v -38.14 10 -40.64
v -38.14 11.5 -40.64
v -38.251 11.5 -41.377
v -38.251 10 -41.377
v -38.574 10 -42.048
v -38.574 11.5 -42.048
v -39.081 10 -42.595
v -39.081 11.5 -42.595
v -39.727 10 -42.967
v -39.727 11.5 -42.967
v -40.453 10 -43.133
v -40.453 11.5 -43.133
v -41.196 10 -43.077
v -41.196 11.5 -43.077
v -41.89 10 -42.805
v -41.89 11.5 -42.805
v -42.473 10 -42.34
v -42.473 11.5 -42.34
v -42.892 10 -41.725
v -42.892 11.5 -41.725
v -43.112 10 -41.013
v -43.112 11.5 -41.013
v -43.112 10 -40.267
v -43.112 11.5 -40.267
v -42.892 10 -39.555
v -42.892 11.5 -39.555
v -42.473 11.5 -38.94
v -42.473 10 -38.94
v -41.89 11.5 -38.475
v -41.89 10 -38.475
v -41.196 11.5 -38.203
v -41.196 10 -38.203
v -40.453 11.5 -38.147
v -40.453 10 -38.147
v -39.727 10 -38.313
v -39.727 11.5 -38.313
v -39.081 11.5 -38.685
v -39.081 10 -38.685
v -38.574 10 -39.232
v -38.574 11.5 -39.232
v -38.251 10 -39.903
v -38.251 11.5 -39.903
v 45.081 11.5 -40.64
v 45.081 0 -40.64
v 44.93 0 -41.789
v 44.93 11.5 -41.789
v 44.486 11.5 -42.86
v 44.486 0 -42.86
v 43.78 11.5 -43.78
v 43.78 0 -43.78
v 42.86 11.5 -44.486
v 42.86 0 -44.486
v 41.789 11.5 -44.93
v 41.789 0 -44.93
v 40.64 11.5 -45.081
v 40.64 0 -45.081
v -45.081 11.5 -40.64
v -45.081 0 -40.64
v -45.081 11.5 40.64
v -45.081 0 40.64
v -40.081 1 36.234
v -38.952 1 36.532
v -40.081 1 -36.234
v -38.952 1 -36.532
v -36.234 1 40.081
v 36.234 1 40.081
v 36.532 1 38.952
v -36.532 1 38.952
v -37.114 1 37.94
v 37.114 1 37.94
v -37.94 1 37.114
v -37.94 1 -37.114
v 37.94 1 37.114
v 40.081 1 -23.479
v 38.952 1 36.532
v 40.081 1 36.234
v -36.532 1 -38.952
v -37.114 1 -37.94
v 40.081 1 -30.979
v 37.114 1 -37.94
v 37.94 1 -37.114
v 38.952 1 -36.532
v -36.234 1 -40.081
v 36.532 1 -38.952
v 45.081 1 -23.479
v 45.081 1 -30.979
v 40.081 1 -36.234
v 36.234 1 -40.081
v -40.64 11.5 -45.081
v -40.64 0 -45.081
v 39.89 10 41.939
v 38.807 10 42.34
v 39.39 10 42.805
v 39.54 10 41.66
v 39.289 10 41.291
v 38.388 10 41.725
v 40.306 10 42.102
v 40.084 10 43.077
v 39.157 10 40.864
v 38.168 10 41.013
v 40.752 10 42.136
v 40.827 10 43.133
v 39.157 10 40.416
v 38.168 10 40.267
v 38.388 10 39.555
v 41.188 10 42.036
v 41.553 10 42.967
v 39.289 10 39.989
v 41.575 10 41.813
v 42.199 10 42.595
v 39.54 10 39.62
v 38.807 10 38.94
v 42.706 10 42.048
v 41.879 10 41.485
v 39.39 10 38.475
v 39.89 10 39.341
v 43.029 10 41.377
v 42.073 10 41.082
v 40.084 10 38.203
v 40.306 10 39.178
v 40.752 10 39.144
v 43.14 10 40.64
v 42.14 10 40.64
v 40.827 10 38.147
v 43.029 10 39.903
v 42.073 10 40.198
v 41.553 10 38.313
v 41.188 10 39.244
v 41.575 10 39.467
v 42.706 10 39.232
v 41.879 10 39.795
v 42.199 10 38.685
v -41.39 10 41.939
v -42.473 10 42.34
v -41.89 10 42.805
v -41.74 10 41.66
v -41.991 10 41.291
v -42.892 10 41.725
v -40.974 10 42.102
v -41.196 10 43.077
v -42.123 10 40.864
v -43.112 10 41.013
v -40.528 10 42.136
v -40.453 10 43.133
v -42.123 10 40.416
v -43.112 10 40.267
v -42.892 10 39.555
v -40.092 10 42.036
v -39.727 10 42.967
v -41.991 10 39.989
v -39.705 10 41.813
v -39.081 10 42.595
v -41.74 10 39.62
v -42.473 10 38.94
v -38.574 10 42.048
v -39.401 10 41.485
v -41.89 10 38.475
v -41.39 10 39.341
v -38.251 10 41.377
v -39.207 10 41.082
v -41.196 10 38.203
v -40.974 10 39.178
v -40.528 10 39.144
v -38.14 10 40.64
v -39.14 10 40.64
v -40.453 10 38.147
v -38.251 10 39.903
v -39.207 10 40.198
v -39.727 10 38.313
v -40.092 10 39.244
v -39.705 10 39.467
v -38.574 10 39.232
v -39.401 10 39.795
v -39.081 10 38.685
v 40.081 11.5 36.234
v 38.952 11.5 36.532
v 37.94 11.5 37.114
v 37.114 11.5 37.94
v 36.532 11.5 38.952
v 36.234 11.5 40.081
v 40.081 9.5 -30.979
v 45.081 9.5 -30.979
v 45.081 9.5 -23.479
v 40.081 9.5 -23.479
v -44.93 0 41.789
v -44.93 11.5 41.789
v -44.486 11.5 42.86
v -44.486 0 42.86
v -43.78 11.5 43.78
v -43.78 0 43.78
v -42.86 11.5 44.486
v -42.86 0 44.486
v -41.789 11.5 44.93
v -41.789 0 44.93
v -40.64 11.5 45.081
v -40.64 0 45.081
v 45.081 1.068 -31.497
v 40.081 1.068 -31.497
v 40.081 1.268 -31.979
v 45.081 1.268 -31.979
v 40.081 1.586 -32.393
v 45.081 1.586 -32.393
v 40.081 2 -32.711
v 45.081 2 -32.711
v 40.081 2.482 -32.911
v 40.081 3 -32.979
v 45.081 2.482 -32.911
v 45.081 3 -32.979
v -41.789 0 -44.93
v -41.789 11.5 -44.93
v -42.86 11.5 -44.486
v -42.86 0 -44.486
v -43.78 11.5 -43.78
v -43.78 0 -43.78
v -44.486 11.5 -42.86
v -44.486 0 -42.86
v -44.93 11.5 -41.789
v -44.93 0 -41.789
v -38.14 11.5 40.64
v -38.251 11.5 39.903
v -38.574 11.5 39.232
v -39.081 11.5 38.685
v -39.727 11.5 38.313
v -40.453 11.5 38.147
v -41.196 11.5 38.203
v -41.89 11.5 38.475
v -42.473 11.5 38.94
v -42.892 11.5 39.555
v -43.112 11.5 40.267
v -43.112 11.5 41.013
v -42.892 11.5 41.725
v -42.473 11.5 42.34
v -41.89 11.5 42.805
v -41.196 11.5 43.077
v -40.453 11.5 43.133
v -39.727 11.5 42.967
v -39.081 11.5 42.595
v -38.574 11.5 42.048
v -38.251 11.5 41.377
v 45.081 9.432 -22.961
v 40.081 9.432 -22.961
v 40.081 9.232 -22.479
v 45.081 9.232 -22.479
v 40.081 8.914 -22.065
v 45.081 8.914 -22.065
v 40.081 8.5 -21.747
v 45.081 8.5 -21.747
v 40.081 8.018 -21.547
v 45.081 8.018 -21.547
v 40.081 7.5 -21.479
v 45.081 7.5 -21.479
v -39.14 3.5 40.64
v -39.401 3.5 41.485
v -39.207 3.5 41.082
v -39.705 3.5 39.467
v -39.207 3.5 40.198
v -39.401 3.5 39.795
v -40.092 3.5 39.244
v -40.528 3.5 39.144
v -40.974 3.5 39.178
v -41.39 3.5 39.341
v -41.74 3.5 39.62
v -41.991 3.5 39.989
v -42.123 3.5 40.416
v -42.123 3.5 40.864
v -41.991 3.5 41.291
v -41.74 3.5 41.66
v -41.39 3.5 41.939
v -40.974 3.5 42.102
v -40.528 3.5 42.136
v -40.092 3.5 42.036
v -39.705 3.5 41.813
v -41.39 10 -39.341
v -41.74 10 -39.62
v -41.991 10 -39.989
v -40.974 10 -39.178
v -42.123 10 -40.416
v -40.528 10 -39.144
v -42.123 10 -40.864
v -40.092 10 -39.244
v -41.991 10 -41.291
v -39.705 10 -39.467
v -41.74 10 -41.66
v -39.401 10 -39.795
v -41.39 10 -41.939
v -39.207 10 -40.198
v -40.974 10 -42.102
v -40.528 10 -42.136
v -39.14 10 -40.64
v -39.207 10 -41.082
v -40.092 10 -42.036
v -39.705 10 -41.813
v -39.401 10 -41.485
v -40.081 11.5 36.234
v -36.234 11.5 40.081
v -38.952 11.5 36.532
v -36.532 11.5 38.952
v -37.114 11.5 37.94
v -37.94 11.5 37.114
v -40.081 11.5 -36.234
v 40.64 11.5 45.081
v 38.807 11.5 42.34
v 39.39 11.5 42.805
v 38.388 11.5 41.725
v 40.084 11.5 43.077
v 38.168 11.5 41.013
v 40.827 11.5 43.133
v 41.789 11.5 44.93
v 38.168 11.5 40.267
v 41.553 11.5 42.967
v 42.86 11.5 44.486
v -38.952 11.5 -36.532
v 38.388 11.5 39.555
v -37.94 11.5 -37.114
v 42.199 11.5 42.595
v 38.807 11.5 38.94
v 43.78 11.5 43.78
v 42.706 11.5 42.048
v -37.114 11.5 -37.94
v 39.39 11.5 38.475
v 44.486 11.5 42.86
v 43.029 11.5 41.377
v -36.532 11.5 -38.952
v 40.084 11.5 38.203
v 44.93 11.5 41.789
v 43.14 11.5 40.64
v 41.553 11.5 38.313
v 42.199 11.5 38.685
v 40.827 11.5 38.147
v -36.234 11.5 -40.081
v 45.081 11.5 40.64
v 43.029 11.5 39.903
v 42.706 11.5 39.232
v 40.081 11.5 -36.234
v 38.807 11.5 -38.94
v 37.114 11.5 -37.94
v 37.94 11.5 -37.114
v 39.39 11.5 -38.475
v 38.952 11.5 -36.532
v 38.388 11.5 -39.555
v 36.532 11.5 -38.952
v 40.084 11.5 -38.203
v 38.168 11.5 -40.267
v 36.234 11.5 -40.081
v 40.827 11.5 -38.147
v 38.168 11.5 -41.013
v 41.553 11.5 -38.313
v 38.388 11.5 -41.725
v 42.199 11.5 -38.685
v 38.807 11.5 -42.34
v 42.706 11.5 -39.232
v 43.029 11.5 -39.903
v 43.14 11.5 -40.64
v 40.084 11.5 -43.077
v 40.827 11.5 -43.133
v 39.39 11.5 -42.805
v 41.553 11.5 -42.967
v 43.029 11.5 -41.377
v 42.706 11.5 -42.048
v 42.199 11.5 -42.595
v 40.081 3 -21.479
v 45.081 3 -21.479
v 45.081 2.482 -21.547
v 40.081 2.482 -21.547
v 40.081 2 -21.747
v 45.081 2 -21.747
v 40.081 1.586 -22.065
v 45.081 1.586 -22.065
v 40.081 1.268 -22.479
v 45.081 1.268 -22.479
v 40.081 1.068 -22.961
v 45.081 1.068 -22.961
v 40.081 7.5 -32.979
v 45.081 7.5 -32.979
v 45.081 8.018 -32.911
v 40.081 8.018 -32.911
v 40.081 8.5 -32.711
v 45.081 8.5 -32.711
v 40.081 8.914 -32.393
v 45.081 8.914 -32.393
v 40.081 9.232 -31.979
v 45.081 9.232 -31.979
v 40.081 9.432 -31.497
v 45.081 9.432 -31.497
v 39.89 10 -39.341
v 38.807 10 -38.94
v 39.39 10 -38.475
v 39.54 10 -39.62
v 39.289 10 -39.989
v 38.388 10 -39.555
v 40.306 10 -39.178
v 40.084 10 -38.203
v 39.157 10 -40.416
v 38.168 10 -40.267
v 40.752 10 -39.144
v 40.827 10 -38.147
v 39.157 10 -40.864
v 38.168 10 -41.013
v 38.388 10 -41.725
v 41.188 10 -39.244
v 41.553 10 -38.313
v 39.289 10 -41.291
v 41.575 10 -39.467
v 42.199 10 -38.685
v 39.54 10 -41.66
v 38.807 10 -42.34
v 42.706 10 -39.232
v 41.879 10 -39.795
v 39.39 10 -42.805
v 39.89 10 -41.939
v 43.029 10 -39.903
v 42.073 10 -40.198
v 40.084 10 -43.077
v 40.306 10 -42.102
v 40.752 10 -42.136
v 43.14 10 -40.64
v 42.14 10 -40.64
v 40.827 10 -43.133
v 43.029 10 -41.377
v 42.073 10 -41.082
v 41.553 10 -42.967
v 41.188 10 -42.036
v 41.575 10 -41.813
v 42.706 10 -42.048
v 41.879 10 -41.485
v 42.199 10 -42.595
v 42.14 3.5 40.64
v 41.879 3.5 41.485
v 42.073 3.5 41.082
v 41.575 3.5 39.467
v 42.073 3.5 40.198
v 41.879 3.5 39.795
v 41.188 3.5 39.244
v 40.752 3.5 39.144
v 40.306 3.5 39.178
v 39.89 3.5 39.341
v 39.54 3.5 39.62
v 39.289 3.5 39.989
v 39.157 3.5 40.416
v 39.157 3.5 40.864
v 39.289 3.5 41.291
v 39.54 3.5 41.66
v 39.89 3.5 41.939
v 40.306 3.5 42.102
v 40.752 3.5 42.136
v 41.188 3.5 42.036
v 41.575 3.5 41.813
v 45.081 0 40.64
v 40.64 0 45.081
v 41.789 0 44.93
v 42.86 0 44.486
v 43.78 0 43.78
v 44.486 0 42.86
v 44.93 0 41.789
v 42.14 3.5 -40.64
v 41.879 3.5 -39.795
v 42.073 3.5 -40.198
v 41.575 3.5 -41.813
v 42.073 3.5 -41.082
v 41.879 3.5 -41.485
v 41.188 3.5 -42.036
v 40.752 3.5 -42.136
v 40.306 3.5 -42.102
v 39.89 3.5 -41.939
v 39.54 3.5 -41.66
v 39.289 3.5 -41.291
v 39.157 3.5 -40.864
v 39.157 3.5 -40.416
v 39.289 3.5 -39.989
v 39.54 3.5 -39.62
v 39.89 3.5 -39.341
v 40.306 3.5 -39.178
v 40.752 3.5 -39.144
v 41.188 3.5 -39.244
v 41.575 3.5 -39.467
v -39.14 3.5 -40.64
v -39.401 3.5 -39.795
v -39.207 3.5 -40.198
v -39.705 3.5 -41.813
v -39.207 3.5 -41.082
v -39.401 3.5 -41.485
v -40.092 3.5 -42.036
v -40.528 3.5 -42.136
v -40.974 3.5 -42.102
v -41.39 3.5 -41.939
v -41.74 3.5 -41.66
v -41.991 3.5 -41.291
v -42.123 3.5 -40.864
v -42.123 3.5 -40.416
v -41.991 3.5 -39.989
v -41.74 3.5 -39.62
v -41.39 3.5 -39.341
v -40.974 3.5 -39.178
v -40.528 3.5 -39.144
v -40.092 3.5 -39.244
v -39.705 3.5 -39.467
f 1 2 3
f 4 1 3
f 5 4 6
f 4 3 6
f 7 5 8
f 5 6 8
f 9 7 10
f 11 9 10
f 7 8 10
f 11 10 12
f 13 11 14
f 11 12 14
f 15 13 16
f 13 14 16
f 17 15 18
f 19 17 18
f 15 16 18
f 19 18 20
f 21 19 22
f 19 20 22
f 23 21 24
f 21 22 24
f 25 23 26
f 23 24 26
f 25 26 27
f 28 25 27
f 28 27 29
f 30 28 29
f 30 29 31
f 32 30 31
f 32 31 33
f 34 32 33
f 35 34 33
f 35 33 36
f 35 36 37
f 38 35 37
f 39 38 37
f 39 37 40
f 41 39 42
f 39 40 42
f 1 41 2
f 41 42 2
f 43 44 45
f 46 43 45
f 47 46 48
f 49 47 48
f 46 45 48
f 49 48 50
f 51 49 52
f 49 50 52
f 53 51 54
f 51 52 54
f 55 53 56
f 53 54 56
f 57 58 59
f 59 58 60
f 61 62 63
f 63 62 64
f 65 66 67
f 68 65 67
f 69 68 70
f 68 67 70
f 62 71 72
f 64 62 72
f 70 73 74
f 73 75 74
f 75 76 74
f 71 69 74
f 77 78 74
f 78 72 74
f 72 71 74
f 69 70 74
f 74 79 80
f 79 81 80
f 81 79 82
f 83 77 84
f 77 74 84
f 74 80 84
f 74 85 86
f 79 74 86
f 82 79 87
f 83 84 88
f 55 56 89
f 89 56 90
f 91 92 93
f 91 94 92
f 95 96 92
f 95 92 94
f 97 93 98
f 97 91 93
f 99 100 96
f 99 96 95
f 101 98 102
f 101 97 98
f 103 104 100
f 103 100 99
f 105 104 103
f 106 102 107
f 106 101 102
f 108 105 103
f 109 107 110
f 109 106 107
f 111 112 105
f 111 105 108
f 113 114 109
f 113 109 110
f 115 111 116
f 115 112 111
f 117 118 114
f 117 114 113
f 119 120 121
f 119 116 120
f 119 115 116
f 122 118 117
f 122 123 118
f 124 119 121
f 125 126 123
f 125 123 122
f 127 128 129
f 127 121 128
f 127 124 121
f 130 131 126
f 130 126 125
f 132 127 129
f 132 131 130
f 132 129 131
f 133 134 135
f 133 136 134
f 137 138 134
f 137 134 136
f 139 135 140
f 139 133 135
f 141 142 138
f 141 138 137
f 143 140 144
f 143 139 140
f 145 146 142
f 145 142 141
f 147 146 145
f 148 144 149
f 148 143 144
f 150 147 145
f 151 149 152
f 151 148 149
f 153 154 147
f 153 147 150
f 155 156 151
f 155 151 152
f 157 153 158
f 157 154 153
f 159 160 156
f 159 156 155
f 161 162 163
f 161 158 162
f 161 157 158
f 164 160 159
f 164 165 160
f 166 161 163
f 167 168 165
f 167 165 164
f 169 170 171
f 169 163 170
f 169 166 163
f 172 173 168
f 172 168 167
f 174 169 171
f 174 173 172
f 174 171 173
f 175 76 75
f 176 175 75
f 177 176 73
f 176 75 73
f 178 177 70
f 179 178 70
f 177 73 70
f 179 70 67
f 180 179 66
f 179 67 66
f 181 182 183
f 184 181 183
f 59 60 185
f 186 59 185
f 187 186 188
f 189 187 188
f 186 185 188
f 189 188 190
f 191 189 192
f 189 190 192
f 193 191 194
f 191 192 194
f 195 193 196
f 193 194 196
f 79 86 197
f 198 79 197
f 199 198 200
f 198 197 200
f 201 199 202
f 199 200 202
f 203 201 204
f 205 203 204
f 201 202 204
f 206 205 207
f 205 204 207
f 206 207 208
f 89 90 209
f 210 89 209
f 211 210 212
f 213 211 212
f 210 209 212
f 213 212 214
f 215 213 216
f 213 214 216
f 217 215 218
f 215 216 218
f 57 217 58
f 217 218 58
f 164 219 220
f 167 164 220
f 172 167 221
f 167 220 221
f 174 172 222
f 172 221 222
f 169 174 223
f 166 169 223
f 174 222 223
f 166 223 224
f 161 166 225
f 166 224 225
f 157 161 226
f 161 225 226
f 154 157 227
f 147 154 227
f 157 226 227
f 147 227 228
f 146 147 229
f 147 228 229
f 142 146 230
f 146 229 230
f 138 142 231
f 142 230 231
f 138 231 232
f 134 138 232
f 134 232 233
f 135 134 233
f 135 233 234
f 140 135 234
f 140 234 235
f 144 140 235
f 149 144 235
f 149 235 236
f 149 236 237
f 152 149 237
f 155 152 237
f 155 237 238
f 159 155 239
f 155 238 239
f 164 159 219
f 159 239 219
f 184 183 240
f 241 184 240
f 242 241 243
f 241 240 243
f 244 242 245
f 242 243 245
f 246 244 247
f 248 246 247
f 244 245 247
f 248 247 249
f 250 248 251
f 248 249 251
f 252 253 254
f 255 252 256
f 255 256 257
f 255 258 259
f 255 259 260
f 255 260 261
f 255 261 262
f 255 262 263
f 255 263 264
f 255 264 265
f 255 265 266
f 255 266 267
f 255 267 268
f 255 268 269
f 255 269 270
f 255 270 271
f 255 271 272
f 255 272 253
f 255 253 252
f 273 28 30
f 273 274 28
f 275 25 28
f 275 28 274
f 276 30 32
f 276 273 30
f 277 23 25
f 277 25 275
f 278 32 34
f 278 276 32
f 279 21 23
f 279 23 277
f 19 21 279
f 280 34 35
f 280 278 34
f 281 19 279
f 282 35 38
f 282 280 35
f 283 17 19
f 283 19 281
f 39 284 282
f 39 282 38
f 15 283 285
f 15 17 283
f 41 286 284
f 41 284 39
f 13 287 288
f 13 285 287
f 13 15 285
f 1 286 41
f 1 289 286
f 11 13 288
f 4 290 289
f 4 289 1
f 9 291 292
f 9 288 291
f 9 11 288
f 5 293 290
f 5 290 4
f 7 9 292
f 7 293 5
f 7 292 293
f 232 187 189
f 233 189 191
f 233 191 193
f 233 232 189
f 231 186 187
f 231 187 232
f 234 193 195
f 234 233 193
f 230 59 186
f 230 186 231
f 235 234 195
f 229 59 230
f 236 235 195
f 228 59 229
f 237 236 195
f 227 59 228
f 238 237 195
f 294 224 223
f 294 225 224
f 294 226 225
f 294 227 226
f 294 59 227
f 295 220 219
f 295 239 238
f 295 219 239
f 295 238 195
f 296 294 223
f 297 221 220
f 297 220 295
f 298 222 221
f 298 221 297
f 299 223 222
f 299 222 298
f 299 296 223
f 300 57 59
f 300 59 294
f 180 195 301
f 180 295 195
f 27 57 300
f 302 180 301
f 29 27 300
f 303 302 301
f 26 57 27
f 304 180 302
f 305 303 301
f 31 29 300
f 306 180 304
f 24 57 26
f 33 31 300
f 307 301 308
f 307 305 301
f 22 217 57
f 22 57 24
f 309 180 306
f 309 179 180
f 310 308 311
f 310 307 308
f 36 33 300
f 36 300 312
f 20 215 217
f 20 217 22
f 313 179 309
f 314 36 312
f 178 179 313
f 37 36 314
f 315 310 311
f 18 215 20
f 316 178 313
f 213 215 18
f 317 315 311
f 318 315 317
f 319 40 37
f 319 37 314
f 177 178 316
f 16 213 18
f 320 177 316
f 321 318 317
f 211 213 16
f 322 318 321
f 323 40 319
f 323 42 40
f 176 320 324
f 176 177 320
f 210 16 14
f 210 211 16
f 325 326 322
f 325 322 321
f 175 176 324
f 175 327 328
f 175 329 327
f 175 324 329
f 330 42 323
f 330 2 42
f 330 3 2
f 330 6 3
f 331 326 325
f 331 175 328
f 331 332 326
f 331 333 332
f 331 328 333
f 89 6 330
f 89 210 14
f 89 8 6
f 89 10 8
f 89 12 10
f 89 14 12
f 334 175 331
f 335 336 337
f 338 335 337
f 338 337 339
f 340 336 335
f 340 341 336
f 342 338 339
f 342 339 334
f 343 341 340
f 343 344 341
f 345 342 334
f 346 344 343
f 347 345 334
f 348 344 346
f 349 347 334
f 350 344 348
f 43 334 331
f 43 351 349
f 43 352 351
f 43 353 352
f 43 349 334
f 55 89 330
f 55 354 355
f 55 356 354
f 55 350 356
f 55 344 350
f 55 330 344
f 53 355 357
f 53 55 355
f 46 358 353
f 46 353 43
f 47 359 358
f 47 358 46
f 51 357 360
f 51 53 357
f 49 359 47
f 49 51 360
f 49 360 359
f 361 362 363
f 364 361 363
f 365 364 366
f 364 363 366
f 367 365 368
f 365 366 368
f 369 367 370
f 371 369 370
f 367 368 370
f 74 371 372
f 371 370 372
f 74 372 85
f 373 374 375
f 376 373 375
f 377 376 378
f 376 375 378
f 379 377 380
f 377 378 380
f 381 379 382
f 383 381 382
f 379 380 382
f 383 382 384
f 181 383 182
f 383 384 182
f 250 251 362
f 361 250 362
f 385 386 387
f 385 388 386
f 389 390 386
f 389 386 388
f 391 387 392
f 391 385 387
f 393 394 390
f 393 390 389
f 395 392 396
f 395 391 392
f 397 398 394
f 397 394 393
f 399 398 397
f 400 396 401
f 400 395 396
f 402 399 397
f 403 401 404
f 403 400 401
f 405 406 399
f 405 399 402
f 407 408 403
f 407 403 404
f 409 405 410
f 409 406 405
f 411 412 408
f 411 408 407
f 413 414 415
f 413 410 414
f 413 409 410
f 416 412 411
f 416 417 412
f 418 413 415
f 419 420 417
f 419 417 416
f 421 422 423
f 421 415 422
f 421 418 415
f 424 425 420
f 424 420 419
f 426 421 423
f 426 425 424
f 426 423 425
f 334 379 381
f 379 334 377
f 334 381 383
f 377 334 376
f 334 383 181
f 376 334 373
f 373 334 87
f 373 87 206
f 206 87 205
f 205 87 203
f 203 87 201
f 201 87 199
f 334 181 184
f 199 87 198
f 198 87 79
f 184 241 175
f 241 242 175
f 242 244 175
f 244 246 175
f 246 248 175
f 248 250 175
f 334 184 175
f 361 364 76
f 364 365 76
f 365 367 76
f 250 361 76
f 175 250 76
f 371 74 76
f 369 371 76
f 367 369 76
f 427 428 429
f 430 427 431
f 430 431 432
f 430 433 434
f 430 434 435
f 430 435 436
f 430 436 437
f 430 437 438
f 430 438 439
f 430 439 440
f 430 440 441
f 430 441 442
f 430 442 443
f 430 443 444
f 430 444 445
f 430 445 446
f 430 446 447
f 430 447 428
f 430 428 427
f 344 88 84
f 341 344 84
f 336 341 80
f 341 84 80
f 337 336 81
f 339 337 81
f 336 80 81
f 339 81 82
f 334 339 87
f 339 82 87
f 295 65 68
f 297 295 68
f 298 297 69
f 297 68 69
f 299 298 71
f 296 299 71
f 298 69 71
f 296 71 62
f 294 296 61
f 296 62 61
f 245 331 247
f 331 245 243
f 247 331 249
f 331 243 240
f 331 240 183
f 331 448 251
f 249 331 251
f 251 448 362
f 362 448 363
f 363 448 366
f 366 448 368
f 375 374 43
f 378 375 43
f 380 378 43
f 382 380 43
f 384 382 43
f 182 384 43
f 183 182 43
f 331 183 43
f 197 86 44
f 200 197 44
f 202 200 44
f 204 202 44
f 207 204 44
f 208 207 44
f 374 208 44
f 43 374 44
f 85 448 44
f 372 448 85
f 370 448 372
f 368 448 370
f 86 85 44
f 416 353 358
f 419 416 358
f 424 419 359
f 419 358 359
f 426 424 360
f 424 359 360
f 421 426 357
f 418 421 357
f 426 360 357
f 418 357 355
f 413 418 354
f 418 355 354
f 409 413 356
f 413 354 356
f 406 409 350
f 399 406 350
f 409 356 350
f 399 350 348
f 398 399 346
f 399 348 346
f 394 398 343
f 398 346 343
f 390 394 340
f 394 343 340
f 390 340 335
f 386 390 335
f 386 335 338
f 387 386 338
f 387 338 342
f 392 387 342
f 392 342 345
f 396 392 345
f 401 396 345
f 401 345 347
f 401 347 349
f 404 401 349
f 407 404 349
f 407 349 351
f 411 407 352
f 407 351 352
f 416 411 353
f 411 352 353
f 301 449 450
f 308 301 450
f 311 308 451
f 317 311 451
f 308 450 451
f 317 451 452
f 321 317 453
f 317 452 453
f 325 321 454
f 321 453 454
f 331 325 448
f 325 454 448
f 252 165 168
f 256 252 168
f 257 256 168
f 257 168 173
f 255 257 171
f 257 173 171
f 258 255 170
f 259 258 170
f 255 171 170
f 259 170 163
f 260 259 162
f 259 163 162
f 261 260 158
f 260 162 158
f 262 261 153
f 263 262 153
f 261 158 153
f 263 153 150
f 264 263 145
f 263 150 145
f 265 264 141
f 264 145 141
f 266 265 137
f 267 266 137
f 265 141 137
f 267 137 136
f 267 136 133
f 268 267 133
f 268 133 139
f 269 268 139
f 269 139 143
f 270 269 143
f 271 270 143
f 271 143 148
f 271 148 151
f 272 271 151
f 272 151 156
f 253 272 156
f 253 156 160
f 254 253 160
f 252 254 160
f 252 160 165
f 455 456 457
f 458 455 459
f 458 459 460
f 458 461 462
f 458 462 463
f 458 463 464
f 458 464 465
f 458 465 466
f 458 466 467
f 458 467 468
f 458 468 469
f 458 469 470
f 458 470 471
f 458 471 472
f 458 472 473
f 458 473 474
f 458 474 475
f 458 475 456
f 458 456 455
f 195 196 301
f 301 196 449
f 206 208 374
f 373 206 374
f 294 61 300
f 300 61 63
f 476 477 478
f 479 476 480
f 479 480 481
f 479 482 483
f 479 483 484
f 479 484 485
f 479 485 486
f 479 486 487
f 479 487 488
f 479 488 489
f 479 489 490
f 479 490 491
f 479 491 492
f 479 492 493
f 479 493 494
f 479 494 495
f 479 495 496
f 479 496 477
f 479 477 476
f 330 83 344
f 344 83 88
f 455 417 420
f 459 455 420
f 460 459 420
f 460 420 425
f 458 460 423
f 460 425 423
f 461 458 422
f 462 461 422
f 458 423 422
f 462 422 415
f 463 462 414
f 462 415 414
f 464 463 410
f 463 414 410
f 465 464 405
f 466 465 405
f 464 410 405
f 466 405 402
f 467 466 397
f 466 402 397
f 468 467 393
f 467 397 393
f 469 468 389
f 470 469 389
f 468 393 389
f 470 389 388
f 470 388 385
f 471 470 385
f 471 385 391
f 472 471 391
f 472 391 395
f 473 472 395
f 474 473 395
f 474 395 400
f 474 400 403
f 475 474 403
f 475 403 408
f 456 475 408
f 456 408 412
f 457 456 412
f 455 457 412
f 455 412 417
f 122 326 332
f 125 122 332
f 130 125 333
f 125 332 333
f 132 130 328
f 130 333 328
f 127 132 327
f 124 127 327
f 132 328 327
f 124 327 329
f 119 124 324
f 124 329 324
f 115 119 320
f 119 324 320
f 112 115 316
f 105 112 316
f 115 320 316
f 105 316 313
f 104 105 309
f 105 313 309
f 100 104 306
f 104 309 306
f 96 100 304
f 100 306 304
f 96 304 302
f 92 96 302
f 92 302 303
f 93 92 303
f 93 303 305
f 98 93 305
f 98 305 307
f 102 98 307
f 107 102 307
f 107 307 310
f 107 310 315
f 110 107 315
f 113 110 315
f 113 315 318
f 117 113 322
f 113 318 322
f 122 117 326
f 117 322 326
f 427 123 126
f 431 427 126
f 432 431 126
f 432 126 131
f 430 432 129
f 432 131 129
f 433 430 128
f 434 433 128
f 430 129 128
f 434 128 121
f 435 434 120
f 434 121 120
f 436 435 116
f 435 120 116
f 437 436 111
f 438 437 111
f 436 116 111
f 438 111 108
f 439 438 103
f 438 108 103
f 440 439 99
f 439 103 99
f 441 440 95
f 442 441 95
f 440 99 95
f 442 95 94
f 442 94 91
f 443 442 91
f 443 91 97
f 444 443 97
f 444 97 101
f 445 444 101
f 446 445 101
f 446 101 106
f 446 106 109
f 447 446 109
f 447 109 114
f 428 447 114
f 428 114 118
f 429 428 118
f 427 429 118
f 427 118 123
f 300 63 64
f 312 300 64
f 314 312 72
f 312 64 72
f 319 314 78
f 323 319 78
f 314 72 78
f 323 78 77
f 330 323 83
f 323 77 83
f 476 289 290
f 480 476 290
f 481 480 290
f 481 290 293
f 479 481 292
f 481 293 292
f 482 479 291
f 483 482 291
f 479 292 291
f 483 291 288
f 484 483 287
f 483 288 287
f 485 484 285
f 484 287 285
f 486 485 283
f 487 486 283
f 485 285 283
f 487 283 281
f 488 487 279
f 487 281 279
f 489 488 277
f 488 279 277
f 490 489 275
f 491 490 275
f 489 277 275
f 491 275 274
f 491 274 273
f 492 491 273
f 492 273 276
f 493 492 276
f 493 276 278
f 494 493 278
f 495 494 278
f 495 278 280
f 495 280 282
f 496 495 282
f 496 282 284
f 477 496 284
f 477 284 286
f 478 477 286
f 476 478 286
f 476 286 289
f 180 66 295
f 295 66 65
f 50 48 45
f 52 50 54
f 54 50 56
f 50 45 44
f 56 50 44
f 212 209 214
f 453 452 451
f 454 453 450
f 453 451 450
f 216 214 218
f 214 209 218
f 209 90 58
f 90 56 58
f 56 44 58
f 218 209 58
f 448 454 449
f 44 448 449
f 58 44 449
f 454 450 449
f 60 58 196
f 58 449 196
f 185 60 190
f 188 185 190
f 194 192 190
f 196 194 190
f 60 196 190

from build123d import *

# Parameters (mm, degrees)
SKETCH1_W           = 7.937979337
SKETCH1_H           = 0.559115352
BOSS_EXTRUDE1_DEPTH = 11.5
SKETCH2_R           = 1.5
CUT_EXTRUDE1_DEPTH  = 8
CUT_EXTRUDE2_DEPTH  = 8
SKETCH4_R           = 2.5
CUT_EXTRUDE3_DEPTH  = 1.5
BOSS_EXTRUDE2_DEPTH = 1


with BuildPart() as part:
    # Sketch1 → Boss-Extrude1 (new body)
    with BuildSketch(Plane(origin=(0, 0, 0), x_dir=(1, 0, 0), z_dir=(0, 1, 0))):
        with BuildLine():
            Line((-40.080884648, -36.23445276), (-40.080884648, 18.423402639))
            Line((-40.080884648, 18.423402639), (-40.64, 18.423402639))
            Line((-40.64, 18.423402639), (-40.64, -36.199115352))
            ThreePointArc((-40.64, -36.199115352), (-40.359884529, -36.207958509), (-40.080884648, -36.23445276))
        make_face()
        with BuildLine():
            Line((-40.080884648, 18.423402639), (-40.080884648, 36.23445276))
            ThreePointArc((-40.080884648, 36.23445276), (-40.359884529, 36.207958509), (-40.64, 36.199115352))
            Line((-40.64, 36.199115352), (-40.64, 18.423402639))
            Line((-40.64, 18.423402639), (-40.080884648, 18.423402639))
        make_face()
        with BuildLine():
            Line((-36.23445276, 40.080884648), (-7.937979337, 40.080884648))
            Line((-7.937979337, 40.080884648), (-7.937979337, 40.64))
            Line((-7.937979337, 40.64), (-36.199115352, 40.64))
            ThreePointArc((-36.199115352, 40.64), (-36.207958509, 40.359884529), (-36.23445276, 40.080884648))
        make_face()
        with BuildLine():
            Line((0, 40.64), (0, 40.080884648))
            Line((0, 40.080884648), (36.23445276, 40.080884648))
            ThreePointArc((36.23445276, 40.080884648), (36.207958509, 40.359884529), (36.199115352, 40.64))
            Line((36.199115352, 40.64), (0, 40.64))
        make_face()
        with Locations((-3.968989669, 40.360442324)):
            Rectangle(SKETCH1_W, SKETCH1_H)
        with BuildLine():
            ThreePointArc((40.64, 36.199115352), (40.359884529, 36.207958509), (40.080884648, 36.23445276))
            Line((40.080884648, 36.23445276), (40.080884648, 28.268480093))
            Line((40.080884648, 28.268480093), (40.64, 28.268480093))
            Line((40.64, 28.268480093), (40.64, 36.199115352))
        make_face()
        with BuildLine():
            Line((40.64, 28.268480093), (40.080884648, 28.268480093))
            Line((40.080884648, 28.268480093), (40.080884648, -36.23445276))
            ThreePointArc((40.080884648, -36.23445276), (40.359884529, -36.207958509), (40.64, -36.199115352))
            Line((40.64, -36.199115352), (40.64, 28.268480093))
        make_face()
        with BuildLine():
            ThreePointArc((40.64, -36.199115352), (40.359884529, -36.207958509), (40.080884648, -36.23445276))
            ThreePointArc((40.080884648, -36.23445276), (37.499820351, -37.499820351), (36.23445276, -40.080884648))
            ThreePointArc((36.23445276, -40.080884648), (36.207958509, -40.359884529), (36.199115352, -40.64))
            Line((36.199115352, -40.64), (40.64, -40.64))
            Line((40.64, -40.64), (40.64, -36.199115352))
        make_face()
        with BuildLine():
            ThreePointArc((45.080884648, -40.64), (43.780179649, -37.499820351), (40.64, -36.199115352))
            Line((40.64, -36.199115352), (40.64, -40.64))
            Line((40.64, -40.64), (36.199115352, -40.64))
            ThreePointArc((36.199115352, -40.64), (37.499820351, -43.780179649), (40.64, -45.080884648))
            ThreePointArc((40.64, -45.080884648), (43.780179649, -43.780179649), (45.080884648, -40.64))
        make_face()
        with BuildLine():
            ThreePointArc((36.199115352, -40.64), (36.207958509, -40.359884529), (36.23445276, -40.080884648))
            Line((36.23445276, -40.080884648), (27.085817246, -40.080884648))
            Line((27.085817246, -40.080884648), (27.085817246, -40.64))
            Line((27.085817246, -40.64), (36.199115352, -40.64))
        make_face()
        with BuildLine():
            Line((27.085817246, -40.080884648), (-36.23445276, -40.080884648))
            ThreePointArc((-36.23445276, -40.080884648), (-36.207958509, -40.359884529), (-36.199115352, -40.64))
            Line((-36.199115352, -40.64), (27.085817246, -40.64))
            Line((27.085817246, -40.64), (27.085817246, -40.080884648))
        make_face()
        with BuildLine():
            Line((-40.64, -40.64), (-40.64, -36.199115352))
            ThreePointArc((-40.64, -36.199115352), (-43.780179649, -37.499820351), (-45.080884648, -40.64))
            ThreePointArc((-45.080884648, -40.64), (-43.780179649, -43.780179649), (-40.64, -45.080884648))
            ThreePointArc((-40.64, -45.080884648), (-37.499820351, -43.780179649), (-36.199115352, -40.64))
            Line((-36.199115352, -40.64), (-40.64, -40.64))
        make_face()
        with BuildLine():
            ThreePointArc((-36.23445276, -40.080884648), (-37.499820351, -37.499820351), (-40.080884648, -36.23445276))
            ThreePointArc((-40.080884648, -36.23445276), (-40.359884529, -36.207958509), (-40.64, -36.199115352))
            Line((-40.64, -36.199115352), (-40.64, -40.64))
            Line((-40.64, -40.64), (-36.199115352, -40.64))
            ThreePointArc((-36.199115352, -40.64), (-36.207958509, -40.359884529), (-36.23445276, -40.080884648))
        make_face()
        with BuildLine():
            Line((-40.64, -40.64), (-40.64, -36.199115352))
            ThreePointArc((-40.64, -36.199115352), (-43.780179649, -37.499820351), (-45.080884648, -40.64))
            ThreePointArc((-45.080884648, -40.64), (-43.780179649, -43.780179649), (-40.64, -45.080884648))
            ThreePointArc((-40.64, -45.080884648), (-37.499820351, -43.780179649), (-36.199115352, -40.64))
            Line((-36.199115352, -40.64), (-40.64, -40.64))
        make_face()
        with BuildLine():
            Line((27.085817246, -40.64), (-36.199115352, -40.64))
            ThreePointArc((-36.199115352, -40.64), (-37.499820351, -43.780179649), (-40.64, -45.080884648))
            Line((-40.64, -45.080884648), (27.085817246, -45.080884648))
            Line((27.085817246, -45.080884648), (27.085817246, -40.64))
        make_face()
        with BuildLine():
            Line((-40.64, -36.199115352), (-40.64, 18.423402639))
            Line((-40.64, 18.423402639), (-45.080884648, 18.423402639))
            Line((-45.080884648, 18.423402639), (-45.080884648, -40.64))
            ThreePointArc((-45.080884648, -40.64), (-43.780179649, -37.499820351), (-40.64, -36.199115352))
        make_face()
        with BuildLine():
            ThreePointArc((45.080884648, -40.64), (43.780179649, -37.499820351), (40.64, -36.199115352))
            Line((40.64, -36.199115352), (40.64, -40.64))
            Line((40.64, -40.64), (36.199115352, -40.64))
            ThreePointArc((36.199115352, -40.64), (37.499820351, -43.780179649), (40.64, -45.080884648))
            ThreePointArc((40.64, -45.080884648), (43.780179649, -43.780179649), (45.080884648, -40.64))
        make_face()
        with BuildLine():
            ThreePointArc((40.64, -45.080884648), (37.499820351, -43.780179649), (36.199115352, -40.64))
            Line((36.199115352, -40.64), (27.085817246, -40.64))
            Line((27.085817246, -40.64), (27.085817246, -45.080884648))
            Line((27.085817246, -45.080884648), (40.64, -45.080884648))
        make_face()
        with BuildLine():
            Line((45.080884648, 28.268480093), (40.64, 28.268480093))
            Line((40.64, 28.268480093), (40.64, -36.199115352))
            ThreePointArc((40.64, -36.199115352), (43.780179649, -37.499820351), (45.080884648, -40.64))
            Line((45.080884648, -40.64), (45.080884648, 28.268480093))
        make_face()
        with BuildLine():
            ThreePointArc((45.080884648, 40.64), (43.780179649, 37.499820351), (40.64, 36.199115352))
            Line((40.64, 36.199115352), (40.64, 28.268480093))
            Line((40.64, 28.268480093), (45.080884648, 28.268480093))
            Line((45.080884648, 28.268480093), (45.080884648, 40.64))
        make_face()
        with BuildLine():
            ThreePointArc((40.64, 45.080884648), (37.499820351, 43.780179649), (36.199115352, 40.64))
            Line((36.199115352, 40.64), (40.64, 40.64))
            Line((40.64, 40.64), (40.64, 36.199115352))
            ThreePointArc((40.64, 36.199115352), (43.780179649, 37.499820351), (45.080884648, 40.64))
            ThreePointArc((45.080884648, 40.64), (43.780179649, 43.780179649), (40.64, 45.080884648))
        make_face()
        with BuildLine():
            ThreePointArc((36.199115352, 40.64), (36.207958509, 40.359884529), (36.23445276, 40.080884648))
            ThreePointArc((36.23445276, 40.080884648), (37.499820351, 37.499820351), (40.080884648, 36.23445276))
            ThreePointArc((40.080884648, 36.23445276), (40.359884529, 36.207958509), (40.64, 36.199115352))
            Line((40.64, 36.199115352), (40.64, 40.64))
            Line((40.64, 40.64), (36.199115352, 40.64))
        make_face()
        with BuildLine():
            ThreePointArc((40.64, 45.080884648), (37.499820351, 43.780179649), (36.199115352, 40.64))
            Line((36.199115352, 40.64), (40.64, 40.64))
            Line((40.64, 40.64), (40.64, 36.199115352))
            ThreePointArc((40.64, 36.199115352), (43.780179649, 37.499820351), (45.080884648, 40.64))
            ThreePointArc((45.080884648, 40.64), (43.780179649, 43.780179649), (40.64, 45.080884648))
        make_face()
        with BuildLine():
            Line((-7.937979337, 40.64), (0, 40.64))
            Line((0, 40.64), (36.199115352, 40.64))
            ThreePointArc((36.199115352, 40.64), (37.499820351, 43.780179649), (40.64, 45.080884648))
            Line((40.64, 45.080884648), (-7.937979337, 45.080884648))
            Line((-7.937979337, 45.080884648), (-7.937979337, 40.64))
        make_face()
        with BuildLine():
            Line((-36.199115352, 40.64), (-7.937979337, 40.64))
            Line((-7.937979337, 40.64), (-7.937979337, 45.080884648))
            Line((-7.937979337, 45.080884648), (-40.64, 45.080884648))
            ThreePointArc((-40.64, 45.080884648), (-37.499820351, 43.780179649), (-36.199115352, 40.64))
        make_face()
        with BuildLine():
            Line((-40.64, 40.64), (-36.199115352, 40.64))
            ThreePointArc((-36.199115352, 40.64), (-37.499820351, 43.780179649), (-40.64, 45.080884648))
            ThreePointArc((-40.64, 45.080884648), (-43.780179649, 43.780179649), (-45.080884648, 40.64))
            ThreePointArc((-45.080884648, 40.64), (-43.780179649, 37.499820351), (-40.64, 36.199115352))
            Line((-40.64, 36.199115352), (-40.64, 40.64))
        make_face()
        with BuildLine():
            ThreePointArc((-40.080884648, 36.23445276), (-37.499820351, 37.499820351), (-36.23445276, 40.080884648))
            ThreePointArc((-36.23445276, 40.080884648), (-36.207958509, 40.359884529), (-36.199115352, 40.64))
            Line((-36.199115352, 40.64), (-40.64, 40.64))
            Line((-40.64, 40.64), (-40.64, 36.199115352))
            ThreePointArc((-40.64, 36.199115352), (-40.359884529, 36.207958509), (-40.080884648, 36.23445276))
        make_face()
        with BuildLine():
            Line((-40.64, 40.64), (-36.199115352, 40.64))
            ThreePointArc((-36.199115352, 40.64), (-37.499820351, 43.780179649), (-40.64, 45.080884648))
            ThreePointArc((-40.64, 45.080884648), (-43.780179649, 43.780179649), (-45.080884648, 40.64))
            ThreePointArc((-45.080884648, 40.64), (-43.780179649, 37.499820351), (-40.64, 36.199115352))
            Line((-40.64, 36.199115352), (-40.64, 40.64))
        make_face()
        with BuildLine():
            Line((-40.64, 18.423402639), (-40.64, 36.199115352))
            ThreePointArc((-40.64, 36.199115352), (-43.780179649, 37.499820351), (-45.080884648, 40.64))
            Line((-45.080884648, 40.64), (-45.080884648, 18.423402639))
            Line((-45.080884648, 18.423402639), (-40.64, 18.423402639))
        make_face()
    extrude(amount=BOSS_EXTRUDE1_DEPTH)

    # Sketch2 → Cut-Extrude1 (cut)
    with BuildSketch(Plane(origin=(0, 11.5, 0), x_dir=(1, 0, 0), z_dir=(0, 1, 0))):
        with Locations((-40.64, 40.64)):
            Circle(SKETCH2_R)
        with Locations((40.64, 40.64)):
            Circle(SKETCH2_R)
        with Locations((40.64, -40.64)):
            Circle(SKETCH2_R)
        with Locations((-40.64, -40.64)):
            Circle(SKETCH2_R)
    extrude(amount=-CUT_EXTRUDE1_DEPTH, mode=Mode.SUBTRACT)

    # Sketch3 → Cut-Extrude2 (cut)
    with BuildSketch(Plane(origin=(45.080884648, 0, 0), x_dir=(0, 0, -1), z_dir=(1, 0, 0))):
        with BuildLine():
            Line((30.979, 9.5), (23.479, 9.5))
            ThreePointArc((23.479, 9.5), (22.064786438, 8.914213562), (21.479, 7.5))
            Line((21.479, 7.5), (21.479, 3))
            ThreePointArc((21.479, 3), (22.064786438, 1.585786438), (23.479, 1))
            Line((23.479, 1), (30.979, 1))
            ThreePointArc((30.979, 1), (32.393213562, 1.585786438), (32.979, 3))
            Line((32.979, 3), (32.979, 7.5))
            ThreePointArc((32.979, 7.5), (32.393213562, 8.914213562), (30.979, 9.5))
        make_face()
    extrude(amount=-CUT_EXTRUDE2_DEPTH, mode=Mode.SUBTRACT)

    # Sketch4 → Cut-Extrude3 (cut)
    with BuildSketch(Plane(origin=(0, 11.5, 0), x_dir=(1, 0, 0), z_dir=(0, 1, 0))):
        with Locations((-40.64, 40.64)):
            Circle(SKETCH4_R)
        with Locations((40.64, 40.64)):
            Circle(SKETCH4_R)
        with Locations((40.64, -40.64)):
            Circle(SKETCH4_R)
        with Locations((-40.64, -40.64)):
            Circle(SKETCH4_R)
    extrude(amount=-CUT_EXTRUDE3_DEPTH, mode=Mode.SUBTRACT)

    # Sketch5 → Boss-Extrude2 (add)
    with BuildSketch(Plane.XZ):
        with BuildLine():
            ThreePointArc((36.23445276, 40.080884648), (37.499820351, 37.499820351), (40.080884648, 36.23445276))
            Line((40.080884648, 36.23445276), (40.080884648, -36.23445276))
            ThreePointArc((40.080884648, -36.23445276), (37.499820351, -37.499820351), (36.23445276, -40.080884648))
            Line((36.23445276, -40.080884648), (-36.23445276, -40.080884648))
            ThreePointArc((-36.23445276, -40.080884648), (-37.499820351, -37.499820351), (-40.080884648, -36.23445276))
            Line((-40.080884648, -36.23445276), (-40.080884648, 36.23445276))
            ThreePointArc((-40.080884648, 36.23445276), (-37.499820351, 37.499820351), (-36.23445276, 40.080884648))
            Line((-36.23445276, 40.080884648), (36.23445276, 40.080884648))
        make_face()
    extrude(amount=-BOSS_EXTRUDE2_DEPTH)


solid = part.part
